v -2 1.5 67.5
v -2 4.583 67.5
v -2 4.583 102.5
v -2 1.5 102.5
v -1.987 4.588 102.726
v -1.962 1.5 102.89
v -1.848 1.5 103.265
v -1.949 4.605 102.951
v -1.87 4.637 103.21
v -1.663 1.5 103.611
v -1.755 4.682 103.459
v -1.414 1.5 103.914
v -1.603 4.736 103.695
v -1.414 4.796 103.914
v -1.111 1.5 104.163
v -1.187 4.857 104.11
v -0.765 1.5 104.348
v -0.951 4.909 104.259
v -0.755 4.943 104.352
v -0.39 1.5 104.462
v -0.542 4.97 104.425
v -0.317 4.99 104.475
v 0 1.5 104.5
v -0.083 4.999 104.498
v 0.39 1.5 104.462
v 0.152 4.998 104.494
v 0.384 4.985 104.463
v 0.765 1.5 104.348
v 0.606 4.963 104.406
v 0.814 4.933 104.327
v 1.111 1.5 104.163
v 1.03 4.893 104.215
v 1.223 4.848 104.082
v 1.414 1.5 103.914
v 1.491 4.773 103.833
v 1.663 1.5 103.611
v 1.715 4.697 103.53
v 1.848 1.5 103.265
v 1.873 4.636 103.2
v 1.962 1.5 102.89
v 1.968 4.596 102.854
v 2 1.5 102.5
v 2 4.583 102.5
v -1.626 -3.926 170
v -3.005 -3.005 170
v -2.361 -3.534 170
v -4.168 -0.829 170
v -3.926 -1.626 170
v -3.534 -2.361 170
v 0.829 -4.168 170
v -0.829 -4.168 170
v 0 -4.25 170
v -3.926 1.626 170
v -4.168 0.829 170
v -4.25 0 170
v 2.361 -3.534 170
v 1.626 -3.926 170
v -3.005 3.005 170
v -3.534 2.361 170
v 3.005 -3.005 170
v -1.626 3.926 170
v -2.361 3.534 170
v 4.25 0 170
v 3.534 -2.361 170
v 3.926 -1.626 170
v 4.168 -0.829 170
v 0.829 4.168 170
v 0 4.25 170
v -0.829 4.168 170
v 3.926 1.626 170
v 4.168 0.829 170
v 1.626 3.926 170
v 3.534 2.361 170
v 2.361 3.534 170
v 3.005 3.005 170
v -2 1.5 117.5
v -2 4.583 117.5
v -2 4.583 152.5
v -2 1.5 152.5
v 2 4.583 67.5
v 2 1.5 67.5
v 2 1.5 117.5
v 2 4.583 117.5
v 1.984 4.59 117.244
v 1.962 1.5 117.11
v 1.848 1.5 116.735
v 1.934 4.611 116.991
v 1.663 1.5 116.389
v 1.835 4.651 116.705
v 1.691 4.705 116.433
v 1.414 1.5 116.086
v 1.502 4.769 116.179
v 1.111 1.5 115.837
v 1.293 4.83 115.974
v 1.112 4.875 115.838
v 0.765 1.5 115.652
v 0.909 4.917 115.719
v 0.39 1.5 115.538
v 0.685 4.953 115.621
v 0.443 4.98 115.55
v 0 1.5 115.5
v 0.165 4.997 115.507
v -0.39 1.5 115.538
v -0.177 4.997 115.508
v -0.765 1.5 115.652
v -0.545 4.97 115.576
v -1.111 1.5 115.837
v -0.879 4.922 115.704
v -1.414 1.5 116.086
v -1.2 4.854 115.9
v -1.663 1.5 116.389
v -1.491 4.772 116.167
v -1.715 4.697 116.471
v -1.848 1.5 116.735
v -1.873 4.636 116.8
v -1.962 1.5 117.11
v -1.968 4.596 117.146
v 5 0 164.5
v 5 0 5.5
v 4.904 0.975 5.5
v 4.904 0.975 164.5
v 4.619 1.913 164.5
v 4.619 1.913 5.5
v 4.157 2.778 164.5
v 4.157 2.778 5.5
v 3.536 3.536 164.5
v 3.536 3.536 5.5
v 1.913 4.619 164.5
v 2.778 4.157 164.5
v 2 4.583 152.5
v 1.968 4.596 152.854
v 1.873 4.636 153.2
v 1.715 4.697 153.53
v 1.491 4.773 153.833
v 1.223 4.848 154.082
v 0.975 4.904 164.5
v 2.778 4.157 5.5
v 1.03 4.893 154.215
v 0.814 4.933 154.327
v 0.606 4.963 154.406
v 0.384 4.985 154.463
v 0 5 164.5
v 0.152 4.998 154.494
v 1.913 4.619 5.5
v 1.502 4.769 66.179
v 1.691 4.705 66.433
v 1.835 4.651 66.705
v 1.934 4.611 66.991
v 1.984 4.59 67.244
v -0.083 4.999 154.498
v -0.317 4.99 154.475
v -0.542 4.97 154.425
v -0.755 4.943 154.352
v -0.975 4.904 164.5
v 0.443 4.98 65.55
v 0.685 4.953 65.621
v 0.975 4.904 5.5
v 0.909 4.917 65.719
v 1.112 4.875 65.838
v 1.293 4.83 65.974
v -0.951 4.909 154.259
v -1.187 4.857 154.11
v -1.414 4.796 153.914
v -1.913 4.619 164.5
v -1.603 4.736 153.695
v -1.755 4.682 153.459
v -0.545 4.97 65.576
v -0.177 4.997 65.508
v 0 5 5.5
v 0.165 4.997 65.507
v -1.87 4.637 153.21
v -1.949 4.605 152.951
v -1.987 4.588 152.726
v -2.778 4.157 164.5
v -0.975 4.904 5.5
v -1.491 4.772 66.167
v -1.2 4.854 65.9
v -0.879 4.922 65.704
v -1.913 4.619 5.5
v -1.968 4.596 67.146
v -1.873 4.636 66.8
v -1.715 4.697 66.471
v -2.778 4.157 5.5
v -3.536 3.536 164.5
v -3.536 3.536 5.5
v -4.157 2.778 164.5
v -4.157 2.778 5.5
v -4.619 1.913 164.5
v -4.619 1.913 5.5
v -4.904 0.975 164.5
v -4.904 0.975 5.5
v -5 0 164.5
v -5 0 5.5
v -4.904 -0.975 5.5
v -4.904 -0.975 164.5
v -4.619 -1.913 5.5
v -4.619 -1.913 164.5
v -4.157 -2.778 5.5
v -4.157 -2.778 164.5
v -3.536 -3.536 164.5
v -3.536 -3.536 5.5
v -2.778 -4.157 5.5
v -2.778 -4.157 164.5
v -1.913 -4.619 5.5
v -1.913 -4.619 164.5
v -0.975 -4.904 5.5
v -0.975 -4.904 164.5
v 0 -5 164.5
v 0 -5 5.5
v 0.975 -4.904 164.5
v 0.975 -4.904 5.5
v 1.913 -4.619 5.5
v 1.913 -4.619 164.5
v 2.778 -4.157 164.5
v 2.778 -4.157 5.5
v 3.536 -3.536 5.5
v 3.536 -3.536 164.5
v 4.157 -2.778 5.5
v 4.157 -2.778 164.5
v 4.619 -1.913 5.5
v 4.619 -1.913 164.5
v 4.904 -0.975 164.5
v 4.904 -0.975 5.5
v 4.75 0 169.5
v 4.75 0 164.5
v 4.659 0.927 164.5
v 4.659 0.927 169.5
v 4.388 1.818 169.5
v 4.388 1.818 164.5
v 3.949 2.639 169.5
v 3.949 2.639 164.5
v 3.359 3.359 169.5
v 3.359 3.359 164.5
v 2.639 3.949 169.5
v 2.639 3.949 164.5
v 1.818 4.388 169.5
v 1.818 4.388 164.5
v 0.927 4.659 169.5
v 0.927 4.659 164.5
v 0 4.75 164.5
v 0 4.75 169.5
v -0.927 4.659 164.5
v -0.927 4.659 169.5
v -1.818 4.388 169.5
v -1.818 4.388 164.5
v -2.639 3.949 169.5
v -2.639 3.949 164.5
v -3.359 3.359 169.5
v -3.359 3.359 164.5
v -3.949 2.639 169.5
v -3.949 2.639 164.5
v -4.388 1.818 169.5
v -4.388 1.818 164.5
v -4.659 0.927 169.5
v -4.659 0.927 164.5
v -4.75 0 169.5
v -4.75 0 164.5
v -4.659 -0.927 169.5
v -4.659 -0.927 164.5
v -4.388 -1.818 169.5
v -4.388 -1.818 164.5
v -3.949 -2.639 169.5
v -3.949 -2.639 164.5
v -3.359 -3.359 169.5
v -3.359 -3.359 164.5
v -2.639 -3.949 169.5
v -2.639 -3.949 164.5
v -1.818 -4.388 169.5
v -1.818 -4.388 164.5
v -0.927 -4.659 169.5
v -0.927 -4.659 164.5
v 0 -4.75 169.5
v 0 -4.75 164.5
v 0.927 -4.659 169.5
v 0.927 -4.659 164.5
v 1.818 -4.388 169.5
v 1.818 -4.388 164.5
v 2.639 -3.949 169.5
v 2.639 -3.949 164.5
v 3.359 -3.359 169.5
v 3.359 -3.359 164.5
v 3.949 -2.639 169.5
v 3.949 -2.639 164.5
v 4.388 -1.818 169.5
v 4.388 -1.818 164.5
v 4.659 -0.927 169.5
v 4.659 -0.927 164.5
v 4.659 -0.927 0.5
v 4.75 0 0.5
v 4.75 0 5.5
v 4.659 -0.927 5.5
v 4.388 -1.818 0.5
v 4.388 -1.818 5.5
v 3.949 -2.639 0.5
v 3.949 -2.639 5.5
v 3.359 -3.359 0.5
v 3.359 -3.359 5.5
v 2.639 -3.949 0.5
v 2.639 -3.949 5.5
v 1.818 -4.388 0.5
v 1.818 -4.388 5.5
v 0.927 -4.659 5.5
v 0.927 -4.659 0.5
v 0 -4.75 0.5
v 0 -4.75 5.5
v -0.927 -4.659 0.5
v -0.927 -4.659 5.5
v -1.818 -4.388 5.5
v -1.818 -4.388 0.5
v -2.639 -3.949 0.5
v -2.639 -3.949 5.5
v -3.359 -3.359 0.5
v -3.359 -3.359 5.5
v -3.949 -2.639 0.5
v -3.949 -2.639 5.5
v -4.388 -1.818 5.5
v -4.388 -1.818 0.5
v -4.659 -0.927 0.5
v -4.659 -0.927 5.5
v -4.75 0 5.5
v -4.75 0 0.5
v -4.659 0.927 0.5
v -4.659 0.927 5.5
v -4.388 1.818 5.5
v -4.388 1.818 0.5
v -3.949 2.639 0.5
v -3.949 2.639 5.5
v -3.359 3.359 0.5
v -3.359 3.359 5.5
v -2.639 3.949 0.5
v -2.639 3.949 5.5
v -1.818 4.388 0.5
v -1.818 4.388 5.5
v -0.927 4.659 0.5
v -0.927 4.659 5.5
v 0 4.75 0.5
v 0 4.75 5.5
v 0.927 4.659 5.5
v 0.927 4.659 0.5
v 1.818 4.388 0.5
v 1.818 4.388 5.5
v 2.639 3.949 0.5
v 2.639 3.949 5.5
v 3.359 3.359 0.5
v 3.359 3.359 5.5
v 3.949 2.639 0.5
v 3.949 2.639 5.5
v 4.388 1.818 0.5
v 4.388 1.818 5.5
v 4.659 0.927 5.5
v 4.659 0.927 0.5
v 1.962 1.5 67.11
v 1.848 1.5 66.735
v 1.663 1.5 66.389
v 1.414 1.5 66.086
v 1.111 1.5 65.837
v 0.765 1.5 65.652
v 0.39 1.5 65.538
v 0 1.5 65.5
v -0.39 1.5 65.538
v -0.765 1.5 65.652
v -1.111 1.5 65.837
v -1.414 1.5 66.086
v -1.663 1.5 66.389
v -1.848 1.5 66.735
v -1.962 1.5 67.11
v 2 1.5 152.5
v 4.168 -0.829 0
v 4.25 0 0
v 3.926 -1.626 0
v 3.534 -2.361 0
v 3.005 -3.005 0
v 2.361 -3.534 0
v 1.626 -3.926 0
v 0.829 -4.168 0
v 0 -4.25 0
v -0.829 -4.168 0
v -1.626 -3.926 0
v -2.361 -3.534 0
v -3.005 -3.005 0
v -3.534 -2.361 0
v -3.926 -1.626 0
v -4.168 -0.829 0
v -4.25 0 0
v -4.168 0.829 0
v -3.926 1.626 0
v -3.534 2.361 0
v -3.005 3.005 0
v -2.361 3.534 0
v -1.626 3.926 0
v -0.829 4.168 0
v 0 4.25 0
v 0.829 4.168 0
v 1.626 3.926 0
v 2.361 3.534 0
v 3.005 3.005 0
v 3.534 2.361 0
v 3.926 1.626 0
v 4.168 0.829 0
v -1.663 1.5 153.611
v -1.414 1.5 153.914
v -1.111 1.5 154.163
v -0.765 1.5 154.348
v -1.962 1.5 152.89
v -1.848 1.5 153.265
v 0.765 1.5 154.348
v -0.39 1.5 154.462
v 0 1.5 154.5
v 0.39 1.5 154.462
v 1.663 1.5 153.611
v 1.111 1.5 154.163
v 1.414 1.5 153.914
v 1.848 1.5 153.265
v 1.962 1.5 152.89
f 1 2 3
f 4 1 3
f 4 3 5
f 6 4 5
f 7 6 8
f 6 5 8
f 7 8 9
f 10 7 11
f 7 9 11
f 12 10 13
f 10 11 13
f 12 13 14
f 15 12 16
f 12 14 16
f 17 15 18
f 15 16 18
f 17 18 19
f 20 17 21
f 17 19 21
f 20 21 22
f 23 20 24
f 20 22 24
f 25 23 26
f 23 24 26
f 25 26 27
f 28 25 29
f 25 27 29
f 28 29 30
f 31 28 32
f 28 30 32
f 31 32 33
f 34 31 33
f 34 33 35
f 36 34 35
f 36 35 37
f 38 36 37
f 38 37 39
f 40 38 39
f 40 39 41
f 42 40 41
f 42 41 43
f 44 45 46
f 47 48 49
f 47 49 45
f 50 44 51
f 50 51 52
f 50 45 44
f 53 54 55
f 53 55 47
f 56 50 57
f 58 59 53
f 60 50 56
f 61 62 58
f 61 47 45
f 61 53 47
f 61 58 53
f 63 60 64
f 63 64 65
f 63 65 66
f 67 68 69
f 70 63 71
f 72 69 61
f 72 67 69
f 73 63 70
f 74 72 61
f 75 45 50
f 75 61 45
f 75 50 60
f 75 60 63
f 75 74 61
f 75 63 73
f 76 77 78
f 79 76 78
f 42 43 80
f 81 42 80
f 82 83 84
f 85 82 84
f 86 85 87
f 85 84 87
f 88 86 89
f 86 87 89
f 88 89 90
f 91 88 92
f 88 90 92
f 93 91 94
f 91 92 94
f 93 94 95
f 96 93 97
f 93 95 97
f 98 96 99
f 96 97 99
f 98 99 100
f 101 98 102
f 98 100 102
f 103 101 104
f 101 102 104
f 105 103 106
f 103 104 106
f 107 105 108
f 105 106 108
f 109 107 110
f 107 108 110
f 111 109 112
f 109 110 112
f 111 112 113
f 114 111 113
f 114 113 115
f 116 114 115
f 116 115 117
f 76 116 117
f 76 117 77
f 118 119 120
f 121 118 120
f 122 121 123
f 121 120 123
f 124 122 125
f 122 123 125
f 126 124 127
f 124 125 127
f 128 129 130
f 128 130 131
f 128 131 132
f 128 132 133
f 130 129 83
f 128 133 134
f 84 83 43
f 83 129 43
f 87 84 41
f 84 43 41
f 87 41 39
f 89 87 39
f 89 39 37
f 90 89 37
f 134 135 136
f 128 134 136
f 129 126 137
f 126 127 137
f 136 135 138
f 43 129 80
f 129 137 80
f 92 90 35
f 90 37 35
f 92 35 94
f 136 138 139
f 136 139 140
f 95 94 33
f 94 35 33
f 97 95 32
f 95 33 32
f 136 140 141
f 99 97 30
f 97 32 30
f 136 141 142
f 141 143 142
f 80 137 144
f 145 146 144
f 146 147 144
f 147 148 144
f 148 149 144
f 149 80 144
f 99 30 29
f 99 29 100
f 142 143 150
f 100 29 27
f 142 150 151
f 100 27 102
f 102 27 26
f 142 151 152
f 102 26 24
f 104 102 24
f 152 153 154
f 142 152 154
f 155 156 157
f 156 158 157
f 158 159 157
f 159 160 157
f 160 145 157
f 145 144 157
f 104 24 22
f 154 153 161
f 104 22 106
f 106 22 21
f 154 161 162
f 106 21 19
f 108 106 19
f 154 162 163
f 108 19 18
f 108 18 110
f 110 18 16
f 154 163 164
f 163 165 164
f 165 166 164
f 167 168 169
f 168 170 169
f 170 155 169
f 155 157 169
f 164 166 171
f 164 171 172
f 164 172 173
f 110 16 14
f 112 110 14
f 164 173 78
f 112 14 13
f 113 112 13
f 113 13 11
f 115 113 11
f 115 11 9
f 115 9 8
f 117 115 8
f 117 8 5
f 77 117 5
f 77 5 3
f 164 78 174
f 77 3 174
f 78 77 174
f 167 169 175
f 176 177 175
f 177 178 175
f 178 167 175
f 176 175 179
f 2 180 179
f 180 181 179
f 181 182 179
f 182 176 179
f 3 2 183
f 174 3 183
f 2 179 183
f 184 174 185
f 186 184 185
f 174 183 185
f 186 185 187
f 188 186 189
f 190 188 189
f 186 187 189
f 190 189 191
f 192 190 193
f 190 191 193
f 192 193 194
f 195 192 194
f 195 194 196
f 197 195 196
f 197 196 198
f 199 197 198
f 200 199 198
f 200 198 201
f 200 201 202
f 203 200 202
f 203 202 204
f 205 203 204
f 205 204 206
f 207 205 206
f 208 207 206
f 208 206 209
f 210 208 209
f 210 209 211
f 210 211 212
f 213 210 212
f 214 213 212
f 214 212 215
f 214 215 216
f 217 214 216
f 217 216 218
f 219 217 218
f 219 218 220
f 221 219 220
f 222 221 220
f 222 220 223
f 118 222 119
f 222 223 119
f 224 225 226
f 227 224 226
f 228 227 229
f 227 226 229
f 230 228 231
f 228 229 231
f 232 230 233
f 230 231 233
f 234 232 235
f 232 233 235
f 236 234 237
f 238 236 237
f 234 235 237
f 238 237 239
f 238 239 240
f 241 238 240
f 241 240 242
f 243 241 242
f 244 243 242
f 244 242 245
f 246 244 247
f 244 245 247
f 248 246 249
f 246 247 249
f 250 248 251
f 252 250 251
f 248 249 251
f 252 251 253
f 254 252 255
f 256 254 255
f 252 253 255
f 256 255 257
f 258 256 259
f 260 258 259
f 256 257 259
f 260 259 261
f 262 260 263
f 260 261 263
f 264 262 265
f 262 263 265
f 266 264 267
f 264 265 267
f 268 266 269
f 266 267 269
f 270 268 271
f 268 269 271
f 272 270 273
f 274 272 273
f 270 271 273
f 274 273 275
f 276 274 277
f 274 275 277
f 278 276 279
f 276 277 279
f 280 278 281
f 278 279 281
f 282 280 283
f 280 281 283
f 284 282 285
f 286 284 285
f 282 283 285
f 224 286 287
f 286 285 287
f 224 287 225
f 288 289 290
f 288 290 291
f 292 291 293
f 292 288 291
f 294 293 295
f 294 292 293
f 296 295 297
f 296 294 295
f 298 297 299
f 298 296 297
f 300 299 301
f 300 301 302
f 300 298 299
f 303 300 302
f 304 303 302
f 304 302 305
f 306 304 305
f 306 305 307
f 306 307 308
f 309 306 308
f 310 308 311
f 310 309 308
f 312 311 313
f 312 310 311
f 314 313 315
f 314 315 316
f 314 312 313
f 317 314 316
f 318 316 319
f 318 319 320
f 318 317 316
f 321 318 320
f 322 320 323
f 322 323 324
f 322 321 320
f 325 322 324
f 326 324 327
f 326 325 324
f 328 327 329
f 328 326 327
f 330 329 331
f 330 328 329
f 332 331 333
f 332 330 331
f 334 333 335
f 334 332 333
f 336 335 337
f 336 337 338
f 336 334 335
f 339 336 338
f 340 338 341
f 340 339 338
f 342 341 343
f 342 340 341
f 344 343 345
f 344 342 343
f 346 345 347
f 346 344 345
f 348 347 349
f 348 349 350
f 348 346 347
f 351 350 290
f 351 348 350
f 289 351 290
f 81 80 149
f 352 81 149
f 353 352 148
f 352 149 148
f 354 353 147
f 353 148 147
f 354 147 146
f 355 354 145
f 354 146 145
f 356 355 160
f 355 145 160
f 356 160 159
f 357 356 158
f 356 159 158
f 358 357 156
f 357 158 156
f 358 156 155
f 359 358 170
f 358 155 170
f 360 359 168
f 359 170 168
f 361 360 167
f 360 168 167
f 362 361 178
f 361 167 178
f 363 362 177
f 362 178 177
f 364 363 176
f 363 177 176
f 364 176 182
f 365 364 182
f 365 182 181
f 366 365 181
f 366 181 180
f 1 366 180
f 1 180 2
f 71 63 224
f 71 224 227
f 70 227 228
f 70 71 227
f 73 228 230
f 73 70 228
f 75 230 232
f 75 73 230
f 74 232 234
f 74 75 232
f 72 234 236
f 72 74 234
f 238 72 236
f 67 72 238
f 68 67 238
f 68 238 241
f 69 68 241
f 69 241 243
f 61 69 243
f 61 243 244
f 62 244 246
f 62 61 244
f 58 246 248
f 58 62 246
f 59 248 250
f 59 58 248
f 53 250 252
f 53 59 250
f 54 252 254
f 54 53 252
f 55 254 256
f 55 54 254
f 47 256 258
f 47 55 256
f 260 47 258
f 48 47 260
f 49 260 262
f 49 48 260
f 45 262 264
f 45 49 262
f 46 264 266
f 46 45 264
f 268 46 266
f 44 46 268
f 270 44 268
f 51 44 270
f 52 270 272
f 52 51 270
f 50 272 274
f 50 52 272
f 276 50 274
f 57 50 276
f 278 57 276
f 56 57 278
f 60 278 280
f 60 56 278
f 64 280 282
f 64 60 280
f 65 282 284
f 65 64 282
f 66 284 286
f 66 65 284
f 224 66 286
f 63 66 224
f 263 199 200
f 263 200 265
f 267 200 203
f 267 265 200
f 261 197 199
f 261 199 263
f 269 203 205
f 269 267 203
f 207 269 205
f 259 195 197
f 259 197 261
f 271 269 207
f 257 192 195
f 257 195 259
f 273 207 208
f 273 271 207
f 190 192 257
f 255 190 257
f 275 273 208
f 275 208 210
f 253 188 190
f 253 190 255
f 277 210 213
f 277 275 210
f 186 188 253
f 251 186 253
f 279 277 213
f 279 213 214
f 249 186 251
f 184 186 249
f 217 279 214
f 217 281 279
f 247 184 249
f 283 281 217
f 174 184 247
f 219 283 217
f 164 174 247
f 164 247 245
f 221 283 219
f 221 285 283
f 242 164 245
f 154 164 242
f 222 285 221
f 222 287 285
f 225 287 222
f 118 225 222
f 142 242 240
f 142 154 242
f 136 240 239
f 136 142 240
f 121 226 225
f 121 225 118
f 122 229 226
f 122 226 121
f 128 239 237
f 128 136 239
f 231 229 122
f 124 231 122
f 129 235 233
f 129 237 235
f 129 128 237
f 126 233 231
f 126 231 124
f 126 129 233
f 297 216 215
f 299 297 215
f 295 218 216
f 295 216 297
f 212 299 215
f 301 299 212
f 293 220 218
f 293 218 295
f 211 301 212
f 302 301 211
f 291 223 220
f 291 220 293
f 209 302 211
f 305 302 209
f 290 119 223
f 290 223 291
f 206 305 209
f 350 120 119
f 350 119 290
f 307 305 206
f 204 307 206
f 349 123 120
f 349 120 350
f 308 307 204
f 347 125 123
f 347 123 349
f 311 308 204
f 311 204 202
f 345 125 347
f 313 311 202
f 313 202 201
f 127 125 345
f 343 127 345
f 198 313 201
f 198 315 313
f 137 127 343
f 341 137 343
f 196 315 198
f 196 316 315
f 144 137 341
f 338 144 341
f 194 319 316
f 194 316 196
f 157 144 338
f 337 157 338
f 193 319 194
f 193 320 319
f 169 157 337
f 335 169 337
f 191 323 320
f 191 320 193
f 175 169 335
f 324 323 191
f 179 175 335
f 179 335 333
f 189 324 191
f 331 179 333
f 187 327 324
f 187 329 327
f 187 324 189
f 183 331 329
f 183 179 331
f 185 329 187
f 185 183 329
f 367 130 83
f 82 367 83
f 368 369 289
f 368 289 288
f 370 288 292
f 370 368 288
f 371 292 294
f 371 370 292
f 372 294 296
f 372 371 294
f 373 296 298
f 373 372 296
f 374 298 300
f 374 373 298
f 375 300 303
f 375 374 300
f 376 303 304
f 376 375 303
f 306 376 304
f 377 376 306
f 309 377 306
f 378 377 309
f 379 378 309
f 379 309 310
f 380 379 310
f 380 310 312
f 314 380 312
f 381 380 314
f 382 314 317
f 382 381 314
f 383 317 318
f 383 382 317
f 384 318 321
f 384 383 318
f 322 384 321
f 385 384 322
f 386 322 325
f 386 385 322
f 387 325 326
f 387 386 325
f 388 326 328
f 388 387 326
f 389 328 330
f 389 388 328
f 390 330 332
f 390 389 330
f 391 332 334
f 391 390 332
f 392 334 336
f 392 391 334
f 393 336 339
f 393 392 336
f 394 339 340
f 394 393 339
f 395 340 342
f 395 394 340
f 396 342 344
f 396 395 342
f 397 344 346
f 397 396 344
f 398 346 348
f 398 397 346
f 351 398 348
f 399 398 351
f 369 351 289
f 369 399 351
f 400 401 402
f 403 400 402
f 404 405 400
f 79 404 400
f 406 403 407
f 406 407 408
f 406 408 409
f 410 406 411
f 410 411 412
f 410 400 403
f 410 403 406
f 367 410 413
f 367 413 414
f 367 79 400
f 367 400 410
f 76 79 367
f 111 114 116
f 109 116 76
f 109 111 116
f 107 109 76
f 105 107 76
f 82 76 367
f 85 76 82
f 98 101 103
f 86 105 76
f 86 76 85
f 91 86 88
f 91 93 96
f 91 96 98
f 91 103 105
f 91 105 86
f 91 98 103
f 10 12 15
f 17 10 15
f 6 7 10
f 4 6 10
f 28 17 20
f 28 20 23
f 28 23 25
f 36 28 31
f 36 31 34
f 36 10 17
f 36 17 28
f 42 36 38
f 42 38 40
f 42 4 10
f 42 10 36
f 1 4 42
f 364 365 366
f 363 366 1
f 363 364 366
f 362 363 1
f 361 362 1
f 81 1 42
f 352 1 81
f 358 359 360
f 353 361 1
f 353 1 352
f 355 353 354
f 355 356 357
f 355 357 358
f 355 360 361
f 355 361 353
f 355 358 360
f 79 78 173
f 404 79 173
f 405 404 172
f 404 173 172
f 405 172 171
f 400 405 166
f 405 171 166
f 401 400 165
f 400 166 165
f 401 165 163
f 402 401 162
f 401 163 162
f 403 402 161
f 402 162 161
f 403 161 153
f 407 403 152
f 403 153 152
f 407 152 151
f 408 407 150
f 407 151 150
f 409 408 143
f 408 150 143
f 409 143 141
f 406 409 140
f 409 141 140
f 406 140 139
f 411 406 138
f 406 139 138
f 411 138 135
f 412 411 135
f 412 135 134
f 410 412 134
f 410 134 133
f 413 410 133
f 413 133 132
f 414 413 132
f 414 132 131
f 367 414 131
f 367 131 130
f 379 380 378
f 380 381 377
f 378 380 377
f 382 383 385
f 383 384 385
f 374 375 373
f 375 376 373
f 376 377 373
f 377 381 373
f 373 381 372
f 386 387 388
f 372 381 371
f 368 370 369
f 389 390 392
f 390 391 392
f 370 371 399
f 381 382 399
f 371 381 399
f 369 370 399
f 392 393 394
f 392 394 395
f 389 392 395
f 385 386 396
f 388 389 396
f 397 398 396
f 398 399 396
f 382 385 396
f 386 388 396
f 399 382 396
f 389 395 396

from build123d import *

# Parameters (mm, degrees)
CROQUIS1_R              = 5
SALIENTE_EXTRUIR1_DEPTH = 170
CORTAR_EXTRUIR1_START   = -5.5
CROQUIS2_R              = 5
CROQUIS2_R_2            = 4.75
CORTAR_EXTRUIR1_DEPTH   = 5.5
CROQUIS3_R              = 5
CROQUIS3_R_2            = 4.75
CORTAR_EXTRUIR2_DEPTH   = 5.5
CHAFL_N1_SIZE           = 0.5
CORTAR_EXTRUIR4_DEPTH   = 3.5


with BuildPart() as part:
    # Croquis1 → Saliente-Extruir1 (new body)
    with BuildSketch(Plane.XY):
        Circle(CROQUIS1_R)
    extrude(amount=SALIENTE_EXTRUIR1_DEPTH)

    # Croquis2 → Cortar-Extruir1 (cut)
    with BuildSketch(Plane.XY.offset(170).offset(CORTAR_EXTRUIR1_START)):
        Circle(CROQUIS2_R)
        Circle(CROQUIS2_R_2, mode=Mode.SUBTRACT)
    extrude(amount=CORTAR_EXTRUIR1_DEPTH, mode=Mode.SUBTRACT)

    # Croquis3 → Cortar-Extruir2 (cut)
    with BuildSketch(Plane(origin=(0, 0, 0), x_dir=(-1, 0, 0), z_dir=(0, 0, -1))):
        Circle(CROQUIS3_R)
        with Locations(Location((0, 0, 0), (0, 0, 180))):
            Circle(CROQUIS3_R_2, mode=Mode.SUBTRACT)
    extrude(amount=-CORTAR_EXTRUIR2_DEPTH, mode=Mode.SUBTRACT)

    # Chaflán1
    chafl_n1_edges = [part.edges().sort_by_distance(p)[0] for p in [
        (-4.75, 0, 0),
        (-4.75, 0, 170),
    ]]
    chamfer(chafl_n1_edges, length=CHAFL_N1_SIZE)

    # Croquis4 → Cortar-Extruir4 (cut)
    with BuildSketch(Plane(origin=(0, 5, 0), x_dir=(-1, 0, 0), z_dir=(0, -1, 0))):
        with BuildLine():
            Line((2, -117.5), (2, -152.5))
            ThreePointArc((2, -152.5), (0, -154.5), (-2, -152.5))
            Line((-2, -152.5), (-2, -117.5))
            ThreePointArc((-2, -117.5), (0, -115.5), (2, -117.5))
        make_face()
        with BuildLine():
            Line((-2, -102.5), (-2, -67.5))
            ThreePointArc((-2, -67.5), (0, -65.5), (2, -67.5))
            Line((2, -67.5), (2, -102.5))
            ThreePointArc((2, -102.5), (0, -104.5), (-2, -102.5))
        make_face()
    extrude(amount=CORTAR_EXTRUIR4_DEPTH, mode=Mode.SUBTRACT)


solid = part.part
